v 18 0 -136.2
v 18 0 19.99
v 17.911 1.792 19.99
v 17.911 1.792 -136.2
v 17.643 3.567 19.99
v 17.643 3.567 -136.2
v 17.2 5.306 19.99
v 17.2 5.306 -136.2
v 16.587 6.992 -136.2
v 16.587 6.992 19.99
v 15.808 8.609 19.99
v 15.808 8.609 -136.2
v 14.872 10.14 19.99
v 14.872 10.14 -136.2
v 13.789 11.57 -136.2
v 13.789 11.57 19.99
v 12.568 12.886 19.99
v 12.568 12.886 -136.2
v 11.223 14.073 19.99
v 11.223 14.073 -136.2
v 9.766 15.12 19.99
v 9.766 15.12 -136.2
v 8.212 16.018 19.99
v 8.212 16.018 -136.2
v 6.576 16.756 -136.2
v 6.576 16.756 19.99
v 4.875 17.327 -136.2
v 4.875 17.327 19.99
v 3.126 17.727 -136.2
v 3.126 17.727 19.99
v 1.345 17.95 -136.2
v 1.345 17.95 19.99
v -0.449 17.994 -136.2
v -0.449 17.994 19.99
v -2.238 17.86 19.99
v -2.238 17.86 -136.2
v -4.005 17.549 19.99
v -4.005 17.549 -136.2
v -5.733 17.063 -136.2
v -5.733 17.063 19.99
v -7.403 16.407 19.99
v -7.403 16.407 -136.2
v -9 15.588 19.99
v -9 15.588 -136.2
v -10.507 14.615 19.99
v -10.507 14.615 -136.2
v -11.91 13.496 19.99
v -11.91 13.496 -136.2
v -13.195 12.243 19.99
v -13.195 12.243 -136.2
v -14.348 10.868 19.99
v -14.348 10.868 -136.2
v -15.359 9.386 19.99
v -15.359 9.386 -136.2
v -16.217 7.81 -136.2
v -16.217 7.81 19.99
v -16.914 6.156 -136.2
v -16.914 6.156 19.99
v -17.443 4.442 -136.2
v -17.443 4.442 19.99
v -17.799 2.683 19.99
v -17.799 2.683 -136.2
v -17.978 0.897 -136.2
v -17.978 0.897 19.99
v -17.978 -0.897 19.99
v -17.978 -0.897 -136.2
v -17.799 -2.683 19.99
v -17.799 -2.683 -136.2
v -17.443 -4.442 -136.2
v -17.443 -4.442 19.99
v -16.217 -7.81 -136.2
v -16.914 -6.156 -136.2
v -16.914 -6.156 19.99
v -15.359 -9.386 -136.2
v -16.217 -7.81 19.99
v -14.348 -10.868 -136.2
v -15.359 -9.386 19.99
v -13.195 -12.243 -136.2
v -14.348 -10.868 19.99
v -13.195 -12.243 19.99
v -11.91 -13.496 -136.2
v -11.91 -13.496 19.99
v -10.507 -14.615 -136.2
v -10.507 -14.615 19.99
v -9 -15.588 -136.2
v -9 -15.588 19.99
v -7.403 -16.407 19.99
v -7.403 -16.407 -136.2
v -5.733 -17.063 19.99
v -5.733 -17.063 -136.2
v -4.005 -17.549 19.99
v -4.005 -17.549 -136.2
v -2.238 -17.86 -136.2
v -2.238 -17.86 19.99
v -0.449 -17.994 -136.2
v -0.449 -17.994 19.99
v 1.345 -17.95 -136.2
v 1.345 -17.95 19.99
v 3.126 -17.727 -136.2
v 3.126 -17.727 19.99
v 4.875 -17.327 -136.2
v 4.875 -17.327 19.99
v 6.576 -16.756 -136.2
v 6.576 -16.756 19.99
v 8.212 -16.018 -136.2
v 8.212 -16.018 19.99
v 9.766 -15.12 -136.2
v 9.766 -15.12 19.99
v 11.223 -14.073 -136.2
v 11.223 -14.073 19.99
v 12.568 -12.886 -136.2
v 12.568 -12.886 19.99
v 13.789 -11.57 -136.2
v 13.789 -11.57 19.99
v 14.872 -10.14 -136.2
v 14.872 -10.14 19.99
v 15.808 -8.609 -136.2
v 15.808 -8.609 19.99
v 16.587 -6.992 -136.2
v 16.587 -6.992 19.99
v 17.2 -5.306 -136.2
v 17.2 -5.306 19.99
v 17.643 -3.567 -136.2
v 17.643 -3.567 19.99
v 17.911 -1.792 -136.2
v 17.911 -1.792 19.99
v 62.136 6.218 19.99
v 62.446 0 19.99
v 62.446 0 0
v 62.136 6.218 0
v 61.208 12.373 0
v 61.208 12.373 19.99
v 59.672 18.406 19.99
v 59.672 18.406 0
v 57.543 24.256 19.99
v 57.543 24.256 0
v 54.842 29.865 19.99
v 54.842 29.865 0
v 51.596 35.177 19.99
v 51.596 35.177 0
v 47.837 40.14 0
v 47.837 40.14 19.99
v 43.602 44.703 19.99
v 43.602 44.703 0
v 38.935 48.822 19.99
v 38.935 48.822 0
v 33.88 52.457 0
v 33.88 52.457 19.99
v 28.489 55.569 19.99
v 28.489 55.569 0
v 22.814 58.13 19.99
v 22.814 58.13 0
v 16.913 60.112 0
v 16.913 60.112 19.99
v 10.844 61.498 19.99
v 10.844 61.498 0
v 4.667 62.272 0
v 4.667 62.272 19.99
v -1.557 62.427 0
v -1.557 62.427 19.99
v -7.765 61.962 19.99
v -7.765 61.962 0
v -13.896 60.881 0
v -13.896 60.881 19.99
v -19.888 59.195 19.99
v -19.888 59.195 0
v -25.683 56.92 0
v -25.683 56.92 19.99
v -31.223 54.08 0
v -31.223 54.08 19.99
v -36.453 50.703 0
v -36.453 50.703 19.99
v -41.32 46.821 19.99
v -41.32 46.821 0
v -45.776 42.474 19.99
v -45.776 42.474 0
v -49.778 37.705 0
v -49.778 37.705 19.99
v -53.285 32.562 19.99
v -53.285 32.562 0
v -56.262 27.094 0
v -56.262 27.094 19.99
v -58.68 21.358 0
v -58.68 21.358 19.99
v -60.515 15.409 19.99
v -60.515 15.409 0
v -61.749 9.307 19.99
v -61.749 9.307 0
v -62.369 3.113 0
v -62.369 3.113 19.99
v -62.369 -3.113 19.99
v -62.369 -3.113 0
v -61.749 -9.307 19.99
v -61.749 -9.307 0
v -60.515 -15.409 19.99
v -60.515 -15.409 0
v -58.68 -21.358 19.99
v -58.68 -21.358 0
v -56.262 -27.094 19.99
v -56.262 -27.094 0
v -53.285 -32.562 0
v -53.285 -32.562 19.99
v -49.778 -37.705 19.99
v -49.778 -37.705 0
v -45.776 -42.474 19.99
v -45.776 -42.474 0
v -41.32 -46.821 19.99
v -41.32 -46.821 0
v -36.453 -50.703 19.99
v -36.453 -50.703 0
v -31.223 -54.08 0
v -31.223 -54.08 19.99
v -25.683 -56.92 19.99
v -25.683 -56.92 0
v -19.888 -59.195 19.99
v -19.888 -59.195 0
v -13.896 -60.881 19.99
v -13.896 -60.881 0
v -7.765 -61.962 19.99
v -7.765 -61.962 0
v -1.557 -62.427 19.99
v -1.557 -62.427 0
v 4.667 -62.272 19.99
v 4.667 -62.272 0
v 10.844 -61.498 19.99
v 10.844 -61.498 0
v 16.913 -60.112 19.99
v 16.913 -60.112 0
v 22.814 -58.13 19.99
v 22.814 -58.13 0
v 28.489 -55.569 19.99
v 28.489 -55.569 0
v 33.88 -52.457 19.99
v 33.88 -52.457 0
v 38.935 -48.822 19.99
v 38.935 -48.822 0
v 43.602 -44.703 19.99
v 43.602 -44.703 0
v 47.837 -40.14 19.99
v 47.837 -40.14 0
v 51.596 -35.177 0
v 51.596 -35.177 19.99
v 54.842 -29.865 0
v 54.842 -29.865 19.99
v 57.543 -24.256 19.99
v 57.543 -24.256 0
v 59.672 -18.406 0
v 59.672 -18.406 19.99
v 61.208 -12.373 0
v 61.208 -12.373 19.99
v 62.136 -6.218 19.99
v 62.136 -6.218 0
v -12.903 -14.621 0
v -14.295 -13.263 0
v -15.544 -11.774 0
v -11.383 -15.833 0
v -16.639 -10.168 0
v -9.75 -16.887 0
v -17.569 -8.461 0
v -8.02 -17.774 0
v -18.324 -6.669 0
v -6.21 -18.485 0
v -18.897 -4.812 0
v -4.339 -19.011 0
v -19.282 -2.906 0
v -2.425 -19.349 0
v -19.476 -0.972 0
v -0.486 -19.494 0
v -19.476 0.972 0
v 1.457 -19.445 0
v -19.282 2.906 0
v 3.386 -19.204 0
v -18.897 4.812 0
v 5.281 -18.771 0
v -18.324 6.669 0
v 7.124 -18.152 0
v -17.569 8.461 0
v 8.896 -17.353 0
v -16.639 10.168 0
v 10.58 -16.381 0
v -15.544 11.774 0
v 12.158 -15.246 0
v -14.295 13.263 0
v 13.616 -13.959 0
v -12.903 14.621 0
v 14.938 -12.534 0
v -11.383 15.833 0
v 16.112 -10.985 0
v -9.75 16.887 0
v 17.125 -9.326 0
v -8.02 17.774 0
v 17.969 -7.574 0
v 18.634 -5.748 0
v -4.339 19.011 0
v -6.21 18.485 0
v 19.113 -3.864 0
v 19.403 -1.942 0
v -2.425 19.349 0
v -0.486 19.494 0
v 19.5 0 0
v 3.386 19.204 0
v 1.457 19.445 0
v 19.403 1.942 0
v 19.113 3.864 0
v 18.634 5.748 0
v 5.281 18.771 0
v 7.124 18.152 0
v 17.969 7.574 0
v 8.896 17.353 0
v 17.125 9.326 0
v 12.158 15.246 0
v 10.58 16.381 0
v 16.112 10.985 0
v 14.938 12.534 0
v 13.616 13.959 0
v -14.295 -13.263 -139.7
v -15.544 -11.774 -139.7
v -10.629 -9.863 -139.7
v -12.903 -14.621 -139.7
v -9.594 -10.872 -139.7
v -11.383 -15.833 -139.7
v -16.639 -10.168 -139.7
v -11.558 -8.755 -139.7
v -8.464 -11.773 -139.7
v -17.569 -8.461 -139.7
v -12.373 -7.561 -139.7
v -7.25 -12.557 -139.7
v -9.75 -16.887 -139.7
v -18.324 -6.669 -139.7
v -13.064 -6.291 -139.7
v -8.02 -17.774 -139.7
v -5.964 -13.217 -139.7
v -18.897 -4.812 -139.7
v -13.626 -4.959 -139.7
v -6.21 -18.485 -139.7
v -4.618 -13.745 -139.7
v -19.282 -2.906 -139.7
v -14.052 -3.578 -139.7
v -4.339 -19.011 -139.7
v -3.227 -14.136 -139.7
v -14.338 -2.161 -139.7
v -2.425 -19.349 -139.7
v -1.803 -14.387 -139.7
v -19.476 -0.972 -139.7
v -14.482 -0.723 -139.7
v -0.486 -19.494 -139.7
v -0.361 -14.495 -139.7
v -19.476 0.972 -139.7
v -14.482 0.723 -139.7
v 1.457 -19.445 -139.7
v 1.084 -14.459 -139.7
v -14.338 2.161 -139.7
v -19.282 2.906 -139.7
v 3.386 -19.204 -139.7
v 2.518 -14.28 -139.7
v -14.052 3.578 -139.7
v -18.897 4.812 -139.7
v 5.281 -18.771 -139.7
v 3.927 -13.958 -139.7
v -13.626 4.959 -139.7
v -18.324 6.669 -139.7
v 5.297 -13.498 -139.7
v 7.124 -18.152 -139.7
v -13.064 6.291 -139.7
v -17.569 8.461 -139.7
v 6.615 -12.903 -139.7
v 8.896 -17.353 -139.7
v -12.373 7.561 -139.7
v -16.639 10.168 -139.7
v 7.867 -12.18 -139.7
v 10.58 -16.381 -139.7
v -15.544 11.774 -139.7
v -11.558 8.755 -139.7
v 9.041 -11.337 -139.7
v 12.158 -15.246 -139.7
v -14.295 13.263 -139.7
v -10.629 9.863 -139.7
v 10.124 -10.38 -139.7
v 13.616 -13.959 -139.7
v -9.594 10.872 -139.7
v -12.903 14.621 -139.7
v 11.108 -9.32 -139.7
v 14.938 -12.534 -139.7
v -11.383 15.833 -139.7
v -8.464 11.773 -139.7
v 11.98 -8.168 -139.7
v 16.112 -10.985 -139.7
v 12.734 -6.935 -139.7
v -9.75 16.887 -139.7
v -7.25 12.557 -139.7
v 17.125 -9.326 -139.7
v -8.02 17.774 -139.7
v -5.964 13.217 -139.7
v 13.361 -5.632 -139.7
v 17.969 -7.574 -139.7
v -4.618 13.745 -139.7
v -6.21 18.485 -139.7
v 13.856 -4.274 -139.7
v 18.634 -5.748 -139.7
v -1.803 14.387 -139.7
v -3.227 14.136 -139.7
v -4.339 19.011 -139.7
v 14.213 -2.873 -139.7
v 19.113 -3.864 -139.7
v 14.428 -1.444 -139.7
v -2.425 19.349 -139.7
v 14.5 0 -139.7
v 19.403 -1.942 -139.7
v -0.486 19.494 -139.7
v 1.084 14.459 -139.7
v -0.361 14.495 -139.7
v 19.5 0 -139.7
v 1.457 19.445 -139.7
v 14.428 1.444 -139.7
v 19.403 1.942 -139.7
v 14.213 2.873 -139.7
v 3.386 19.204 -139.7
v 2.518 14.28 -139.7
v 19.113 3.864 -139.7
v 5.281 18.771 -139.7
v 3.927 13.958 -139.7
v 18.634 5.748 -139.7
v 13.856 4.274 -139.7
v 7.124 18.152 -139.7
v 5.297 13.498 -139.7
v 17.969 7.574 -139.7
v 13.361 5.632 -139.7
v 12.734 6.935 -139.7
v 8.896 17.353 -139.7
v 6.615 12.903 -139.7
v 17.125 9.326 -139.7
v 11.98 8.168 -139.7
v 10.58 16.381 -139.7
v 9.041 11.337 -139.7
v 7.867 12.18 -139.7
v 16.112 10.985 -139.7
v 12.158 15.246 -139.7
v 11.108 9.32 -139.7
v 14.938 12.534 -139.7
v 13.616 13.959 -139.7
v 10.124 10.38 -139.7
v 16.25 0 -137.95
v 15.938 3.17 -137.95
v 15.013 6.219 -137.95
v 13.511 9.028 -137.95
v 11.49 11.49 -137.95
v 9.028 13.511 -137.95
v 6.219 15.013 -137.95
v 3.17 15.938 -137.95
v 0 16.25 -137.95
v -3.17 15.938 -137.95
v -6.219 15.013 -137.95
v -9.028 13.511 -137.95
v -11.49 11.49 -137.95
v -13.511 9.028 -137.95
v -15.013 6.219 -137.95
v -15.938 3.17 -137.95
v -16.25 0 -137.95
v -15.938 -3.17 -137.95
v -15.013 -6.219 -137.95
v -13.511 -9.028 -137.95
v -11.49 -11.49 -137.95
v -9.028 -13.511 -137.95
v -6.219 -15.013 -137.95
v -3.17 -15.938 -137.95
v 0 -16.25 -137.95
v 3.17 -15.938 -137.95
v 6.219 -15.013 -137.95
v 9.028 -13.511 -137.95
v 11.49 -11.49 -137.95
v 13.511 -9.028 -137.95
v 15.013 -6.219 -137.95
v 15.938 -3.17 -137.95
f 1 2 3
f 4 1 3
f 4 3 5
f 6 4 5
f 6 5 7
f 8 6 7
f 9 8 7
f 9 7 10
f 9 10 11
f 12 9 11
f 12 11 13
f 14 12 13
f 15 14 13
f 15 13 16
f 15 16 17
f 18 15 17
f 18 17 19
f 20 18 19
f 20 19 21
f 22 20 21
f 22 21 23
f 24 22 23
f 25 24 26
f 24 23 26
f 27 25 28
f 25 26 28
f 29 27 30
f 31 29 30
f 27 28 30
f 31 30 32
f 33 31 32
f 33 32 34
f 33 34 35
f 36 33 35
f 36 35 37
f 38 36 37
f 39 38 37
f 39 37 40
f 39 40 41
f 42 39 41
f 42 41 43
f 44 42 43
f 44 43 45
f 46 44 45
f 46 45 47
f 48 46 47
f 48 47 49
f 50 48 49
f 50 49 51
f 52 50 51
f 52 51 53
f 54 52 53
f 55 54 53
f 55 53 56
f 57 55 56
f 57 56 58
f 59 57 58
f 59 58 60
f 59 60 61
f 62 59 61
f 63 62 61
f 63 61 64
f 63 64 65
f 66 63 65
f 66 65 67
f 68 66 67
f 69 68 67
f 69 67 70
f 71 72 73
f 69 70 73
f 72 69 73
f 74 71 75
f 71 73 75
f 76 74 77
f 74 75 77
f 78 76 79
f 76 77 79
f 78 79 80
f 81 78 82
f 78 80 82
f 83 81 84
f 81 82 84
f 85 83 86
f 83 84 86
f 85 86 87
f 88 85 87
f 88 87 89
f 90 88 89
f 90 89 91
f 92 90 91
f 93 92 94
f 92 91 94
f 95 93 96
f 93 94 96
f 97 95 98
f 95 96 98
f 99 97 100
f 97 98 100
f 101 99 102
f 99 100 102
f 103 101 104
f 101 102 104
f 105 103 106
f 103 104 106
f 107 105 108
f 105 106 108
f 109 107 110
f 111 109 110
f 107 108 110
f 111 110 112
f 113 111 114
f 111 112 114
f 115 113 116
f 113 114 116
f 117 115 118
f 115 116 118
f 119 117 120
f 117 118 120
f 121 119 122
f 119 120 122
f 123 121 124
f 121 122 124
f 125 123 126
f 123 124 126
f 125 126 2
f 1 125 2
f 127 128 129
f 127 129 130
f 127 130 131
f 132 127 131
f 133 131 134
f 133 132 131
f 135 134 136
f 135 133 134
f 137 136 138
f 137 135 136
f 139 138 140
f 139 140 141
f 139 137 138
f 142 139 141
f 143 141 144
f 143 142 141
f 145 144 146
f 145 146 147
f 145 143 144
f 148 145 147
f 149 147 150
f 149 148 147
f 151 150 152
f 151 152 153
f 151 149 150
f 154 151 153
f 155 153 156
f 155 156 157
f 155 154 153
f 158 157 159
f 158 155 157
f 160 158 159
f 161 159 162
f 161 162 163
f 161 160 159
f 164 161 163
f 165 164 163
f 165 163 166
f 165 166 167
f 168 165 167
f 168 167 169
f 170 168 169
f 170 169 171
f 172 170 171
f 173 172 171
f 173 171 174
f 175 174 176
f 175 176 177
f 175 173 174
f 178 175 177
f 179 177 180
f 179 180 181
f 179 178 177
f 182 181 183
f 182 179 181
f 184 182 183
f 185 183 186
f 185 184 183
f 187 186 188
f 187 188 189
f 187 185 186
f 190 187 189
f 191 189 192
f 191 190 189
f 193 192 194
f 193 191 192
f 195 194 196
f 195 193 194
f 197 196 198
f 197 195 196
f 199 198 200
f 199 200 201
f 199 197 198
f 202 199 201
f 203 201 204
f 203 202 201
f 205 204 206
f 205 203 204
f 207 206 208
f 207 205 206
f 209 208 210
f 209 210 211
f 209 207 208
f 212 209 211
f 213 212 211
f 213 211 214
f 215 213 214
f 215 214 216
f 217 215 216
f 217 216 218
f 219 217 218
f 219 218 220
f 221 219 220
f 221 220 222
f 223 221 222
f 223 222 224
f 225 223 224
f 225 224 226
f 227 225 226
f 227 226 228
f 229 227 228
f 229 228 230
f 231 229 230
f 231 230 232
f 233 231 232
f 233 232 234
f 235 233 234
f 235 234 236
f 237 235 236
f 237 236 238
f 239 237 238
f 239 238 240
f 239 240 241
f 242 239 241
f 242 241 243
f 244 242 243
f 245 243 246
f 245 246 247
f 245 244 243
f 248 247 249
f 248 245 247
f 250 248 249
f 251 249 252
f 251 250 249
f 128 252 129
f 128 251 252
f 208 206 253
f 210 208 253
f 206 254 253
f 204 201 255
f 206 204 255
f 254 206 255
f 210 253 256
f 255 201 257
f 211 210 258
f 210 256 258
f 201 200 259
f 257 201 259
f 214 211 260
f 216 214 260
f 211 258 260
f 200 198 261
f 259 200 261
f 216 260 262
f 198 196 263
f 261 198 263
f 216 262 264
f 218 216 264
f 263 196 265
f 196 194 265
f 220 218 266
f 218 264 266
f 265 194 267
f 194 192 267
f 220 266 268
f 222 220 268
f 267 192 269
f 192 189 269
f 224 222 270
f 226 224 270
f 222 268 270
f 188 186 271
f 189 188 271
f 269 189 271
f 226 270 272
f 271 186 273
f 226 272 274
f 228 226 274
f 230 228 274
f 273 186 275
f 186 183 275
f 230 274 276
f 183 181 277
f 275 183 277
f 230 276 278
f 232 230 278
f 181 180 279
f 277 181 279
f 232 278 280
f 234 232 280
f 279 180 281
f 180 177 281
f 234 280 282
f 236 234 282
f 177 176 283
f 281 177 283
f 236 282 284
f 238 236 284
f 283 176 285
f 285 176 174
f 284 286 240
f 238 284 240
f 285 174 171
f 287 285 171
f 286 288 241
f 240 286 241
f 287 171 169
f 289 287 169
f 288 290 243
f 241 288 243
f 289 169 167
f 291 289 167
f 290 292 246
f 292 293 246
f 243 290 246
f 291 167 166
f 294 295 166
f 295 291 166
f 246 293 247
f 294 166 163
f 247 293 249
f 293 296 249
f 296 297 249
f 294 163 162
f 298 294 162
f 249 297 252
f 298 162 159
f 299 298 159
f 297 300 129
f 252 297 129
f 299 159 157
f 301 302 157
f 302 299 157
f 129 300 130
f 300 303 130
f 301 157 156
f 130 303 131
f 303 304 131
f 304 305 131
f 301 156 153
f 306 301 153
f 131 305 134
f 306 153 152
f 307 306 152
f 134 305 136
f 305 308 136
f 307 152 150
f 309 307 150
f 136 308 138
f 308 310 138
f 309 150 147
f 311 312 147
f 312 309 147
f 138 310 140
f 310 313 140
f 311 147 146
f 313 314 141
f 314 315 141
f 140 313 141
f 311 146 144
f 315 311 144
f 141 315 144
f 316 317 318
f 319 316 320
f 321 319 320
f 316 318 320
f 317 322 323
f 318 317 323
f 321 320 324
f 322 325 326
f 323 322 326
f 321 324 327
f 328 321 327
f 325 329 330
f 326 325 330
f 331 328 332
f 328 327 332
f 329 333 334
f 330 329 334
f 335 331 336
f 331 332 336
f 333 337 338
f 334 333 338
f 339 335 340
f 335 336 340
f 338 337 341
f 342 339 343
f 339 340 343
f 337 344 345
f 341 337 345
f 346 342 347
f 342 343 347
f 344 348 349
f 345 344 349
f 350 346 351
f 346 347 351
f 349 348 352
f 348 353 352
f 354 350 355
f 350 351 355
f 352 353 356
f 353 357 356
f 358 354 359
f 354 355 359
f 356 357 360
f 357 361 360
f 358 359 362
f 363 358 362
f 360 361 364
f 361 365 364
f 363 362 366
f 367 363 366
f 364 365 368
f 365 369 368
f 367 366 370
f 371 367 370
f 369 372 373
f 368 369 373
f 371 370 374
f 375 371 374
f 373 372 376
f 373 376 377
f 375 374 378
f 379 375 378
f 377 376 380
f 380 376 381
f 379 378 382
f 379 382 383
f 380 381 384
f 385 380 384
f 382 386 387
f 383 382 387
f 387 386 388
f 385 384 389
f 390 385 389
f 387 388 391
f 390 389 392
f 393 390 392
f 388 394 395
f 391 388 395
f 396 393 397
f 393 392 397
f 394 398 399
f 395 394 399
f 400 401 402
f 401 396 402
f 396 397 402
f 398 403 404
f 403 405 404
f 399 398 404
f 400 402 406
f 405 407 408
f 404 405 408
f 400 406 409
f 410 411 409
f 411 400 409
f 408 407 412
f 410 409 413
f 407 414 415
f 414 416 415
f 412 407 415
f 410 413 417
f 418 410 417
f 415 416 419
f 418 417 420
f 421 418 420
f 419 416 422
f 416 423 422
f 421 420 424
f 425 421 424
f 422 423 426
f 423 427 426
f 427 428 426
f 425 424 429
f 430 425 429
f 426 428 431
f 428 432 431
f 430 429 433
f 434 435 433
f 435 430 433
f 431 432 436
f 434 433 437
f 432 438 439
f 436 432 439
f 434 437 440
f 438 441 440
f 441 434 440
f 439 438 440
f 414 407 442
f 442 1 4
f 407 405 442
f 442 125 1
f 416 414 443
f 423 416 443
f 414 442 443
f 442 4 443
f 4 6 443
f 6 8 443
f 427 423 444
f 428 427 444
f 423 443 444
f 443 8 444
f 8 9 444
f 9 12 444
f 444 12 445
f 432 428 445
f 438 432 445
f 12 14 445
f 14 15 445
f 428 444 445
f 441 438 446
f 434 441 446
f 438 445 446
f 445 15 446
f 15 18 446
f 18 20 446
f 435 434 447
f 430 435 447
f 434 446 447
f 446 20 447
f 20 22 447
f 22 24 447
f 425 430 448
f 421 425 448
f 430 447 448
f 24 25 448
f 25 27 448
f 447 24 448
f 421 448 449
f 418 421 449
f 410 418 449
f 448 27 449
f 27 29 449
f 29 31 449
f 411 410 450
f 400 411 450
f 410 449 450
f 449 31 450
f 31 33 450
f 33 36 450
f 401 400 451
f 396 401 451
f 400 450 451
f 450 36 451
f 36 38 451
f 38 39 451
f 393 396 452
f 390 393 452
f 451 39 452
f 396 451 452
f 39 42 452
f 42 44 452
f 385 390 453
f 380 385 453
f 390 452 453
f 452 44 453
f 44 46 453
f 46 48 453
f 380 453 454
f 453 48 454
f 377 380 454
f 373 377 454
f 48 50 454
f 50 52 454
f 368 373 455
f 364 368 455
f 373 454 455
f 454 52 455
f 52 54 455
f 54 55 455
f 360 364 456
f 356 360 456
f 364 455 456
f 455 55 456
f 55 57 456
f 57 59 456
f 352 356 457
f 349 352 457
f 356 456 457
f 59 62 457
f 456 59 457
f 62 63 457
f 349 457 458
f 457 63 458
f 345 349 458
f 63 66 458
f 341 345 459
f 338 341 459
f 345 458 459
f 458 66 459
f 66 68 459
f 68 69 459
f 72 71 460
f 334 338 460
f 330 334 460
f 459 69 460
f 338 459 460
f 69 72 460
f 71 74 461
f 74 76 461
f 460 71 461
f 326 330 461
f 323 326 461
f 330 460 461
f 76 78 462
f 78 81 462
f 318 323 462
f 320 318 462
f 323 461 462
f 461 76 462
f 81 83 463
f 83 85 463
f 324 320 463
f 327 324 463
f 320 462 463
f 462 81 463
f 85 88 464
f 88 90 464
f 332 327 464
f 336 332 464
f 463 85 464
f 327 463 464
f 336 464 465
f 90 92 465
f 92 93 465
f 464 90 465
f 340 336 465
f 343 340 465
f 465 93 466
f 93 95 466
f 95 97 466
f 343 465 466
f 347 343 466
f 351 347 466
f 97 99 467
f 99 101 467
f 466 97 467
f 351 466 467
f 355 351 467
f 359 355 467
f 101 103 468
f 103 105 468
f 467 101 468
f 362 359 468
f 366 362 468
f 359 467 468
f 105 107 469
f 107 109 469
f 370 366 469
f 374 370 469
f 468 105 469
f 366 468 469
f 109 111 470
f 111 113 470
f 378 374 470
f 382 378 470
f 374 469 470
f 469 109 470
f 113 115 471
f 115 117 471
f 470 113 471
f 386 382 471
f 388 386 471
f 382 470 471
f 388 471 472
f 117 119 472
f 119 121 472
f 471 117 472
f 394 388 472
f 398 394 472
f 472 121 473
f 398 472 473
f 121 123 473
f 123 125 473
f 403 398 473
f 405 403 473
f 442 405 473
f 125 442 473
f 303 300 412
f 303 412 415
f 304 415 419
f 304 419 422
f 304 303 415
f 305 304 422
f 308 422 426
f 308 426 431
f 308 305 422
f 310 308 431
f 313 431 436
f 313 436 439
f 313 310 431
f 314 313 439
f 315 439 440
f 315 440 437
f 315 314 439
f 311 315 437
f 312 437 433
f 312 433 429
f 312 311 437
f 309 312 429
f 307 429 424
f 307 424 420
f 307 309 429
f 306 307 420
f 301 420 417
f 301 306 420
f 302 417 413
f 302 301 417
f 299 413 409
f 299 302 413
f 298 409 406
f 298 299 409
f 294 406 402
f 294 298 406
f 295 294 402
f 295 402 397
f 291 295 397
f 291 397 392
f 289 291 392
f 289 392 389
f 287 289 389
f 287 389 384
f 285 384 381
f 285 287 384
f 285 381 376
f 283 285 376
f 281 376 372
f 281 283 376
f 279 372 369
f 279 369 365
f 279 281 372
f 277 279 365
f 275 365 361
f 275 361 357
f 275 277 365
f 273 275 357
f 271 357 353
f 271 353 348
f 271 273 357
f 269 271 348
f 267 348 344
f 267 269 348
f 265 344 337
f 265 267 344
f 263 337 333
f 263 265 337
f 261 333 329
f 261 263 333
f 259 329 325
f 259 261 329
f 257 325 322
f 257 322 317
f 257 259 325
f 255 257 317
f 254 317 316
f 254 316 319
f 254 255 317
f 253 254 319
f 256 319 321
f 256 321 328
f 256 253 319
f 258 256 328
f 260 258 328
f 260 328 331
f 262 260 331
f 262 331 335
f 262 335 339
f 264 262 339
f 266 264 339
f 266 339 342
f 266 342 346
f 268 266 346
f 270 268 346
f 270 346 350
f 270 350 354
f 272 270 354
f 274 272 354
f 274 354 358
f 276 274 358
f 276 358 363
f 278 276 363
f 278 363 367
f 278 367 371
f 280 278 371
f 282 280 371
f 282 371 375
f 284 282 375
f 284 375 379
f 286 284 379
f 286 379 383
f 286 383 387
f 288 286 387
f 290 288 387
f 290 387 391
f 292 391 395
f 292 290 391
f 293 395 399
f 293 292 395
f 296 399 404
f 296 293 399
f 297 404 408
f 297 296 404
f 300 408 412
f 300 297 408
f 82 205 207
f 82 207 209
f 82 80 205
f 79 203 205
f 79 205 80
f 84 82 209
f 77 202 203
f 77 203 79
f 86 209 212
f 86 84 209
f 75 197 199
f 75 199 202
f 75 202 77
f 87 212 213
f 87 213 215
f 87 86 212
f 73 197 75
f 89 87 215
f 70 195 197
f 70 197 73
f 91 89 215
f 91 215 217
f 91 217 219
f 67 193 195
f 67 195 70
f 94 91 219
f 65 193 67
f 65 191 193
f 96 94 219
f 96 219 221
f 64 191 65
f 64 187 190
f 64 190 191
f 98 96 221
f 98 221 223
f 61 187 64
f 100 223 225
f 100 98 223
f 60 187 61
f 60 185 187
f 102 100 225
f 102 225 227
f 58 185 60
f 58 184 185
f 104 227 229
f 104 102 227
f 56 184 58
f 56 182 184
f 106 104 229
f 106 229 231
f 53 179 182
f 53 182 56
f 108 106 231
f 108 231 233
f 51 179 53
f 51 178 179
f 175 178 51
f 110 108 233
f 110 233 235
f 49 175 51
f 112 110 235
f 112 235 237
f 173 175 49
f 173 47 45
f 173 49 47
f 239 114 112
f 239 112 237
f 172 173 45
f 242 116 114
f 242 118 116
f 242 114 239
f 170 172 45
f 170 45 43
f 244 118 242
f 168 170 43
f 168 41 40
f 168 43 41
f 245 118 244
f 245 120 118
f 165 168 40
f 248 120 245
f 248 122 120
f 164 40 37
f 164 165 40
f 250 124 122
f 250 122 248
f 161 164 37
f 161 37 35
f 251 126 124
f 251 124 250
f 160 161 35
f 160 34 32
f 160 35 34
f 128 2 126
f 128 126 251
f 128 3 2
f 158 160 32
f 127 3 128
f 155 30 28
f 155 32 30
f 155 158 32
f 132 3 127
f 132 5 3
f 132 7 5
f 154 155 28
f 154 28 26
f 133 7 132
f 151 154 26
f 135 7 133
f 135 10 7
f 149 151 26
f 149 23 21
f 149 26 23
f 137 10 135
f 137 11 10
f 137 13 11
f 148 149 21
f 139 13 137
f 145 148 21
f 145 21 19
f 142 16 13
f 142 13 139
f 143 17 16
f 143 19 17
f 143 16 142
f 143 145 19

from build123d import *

# Parameters (mm, degrees)
SKETCH1_R      = 19.5
SKETCH1_R_2    = 18
EXTRUDE1_DEPTH = 139.7
EXTRUDE2_START = 19.9898
SKETCH2_R      = 62.446297133
SKETCH2_R_2    = 18
EXTRUDE2_DEPTH = 19.9898


with BuildPart() as part:
    # Sketch1 → Extrude1 (new body)
    with BuildSketch(Plane.XY):
        Circle(SKETCH1_R)
        Circle(SKETCH1_R_2, mode=Mode.SUBTRACT)
    extrude(amount=-EXTRUDE1_DEPTH)

    # Sketch2 → Extrude2 (add)
    with BuildSketch(Plane.XY.offset(EXTRUDE2_START)):
        Circle(SKETCH2_R)
        Circle(SKETCH2_R_2, mode=Mode.SUBTRACT)
    extrude(amount=-EXTRUDE2_DEPTH)

    # Sketch3 → Revolve1 (revolve)
    with BuildSketch(Plane(origin=(0, 0, 0), x_dir=(0, 0, -1), z_dir=(1, 0, 0)), mode=Mode.PRIVATE) as revolve1_sk:
        Polygon((139.7, 18), (139.7, 14.5), (136.2, 18), align=None)
    revolve(revolve1_sk.sketch.rotate(Axis((0, 0, -143.10013627), (0, 0, 1)), 270), axis=Axis((0, 0, -143.10013627), (0, 0, 1)))


solid = part.part
